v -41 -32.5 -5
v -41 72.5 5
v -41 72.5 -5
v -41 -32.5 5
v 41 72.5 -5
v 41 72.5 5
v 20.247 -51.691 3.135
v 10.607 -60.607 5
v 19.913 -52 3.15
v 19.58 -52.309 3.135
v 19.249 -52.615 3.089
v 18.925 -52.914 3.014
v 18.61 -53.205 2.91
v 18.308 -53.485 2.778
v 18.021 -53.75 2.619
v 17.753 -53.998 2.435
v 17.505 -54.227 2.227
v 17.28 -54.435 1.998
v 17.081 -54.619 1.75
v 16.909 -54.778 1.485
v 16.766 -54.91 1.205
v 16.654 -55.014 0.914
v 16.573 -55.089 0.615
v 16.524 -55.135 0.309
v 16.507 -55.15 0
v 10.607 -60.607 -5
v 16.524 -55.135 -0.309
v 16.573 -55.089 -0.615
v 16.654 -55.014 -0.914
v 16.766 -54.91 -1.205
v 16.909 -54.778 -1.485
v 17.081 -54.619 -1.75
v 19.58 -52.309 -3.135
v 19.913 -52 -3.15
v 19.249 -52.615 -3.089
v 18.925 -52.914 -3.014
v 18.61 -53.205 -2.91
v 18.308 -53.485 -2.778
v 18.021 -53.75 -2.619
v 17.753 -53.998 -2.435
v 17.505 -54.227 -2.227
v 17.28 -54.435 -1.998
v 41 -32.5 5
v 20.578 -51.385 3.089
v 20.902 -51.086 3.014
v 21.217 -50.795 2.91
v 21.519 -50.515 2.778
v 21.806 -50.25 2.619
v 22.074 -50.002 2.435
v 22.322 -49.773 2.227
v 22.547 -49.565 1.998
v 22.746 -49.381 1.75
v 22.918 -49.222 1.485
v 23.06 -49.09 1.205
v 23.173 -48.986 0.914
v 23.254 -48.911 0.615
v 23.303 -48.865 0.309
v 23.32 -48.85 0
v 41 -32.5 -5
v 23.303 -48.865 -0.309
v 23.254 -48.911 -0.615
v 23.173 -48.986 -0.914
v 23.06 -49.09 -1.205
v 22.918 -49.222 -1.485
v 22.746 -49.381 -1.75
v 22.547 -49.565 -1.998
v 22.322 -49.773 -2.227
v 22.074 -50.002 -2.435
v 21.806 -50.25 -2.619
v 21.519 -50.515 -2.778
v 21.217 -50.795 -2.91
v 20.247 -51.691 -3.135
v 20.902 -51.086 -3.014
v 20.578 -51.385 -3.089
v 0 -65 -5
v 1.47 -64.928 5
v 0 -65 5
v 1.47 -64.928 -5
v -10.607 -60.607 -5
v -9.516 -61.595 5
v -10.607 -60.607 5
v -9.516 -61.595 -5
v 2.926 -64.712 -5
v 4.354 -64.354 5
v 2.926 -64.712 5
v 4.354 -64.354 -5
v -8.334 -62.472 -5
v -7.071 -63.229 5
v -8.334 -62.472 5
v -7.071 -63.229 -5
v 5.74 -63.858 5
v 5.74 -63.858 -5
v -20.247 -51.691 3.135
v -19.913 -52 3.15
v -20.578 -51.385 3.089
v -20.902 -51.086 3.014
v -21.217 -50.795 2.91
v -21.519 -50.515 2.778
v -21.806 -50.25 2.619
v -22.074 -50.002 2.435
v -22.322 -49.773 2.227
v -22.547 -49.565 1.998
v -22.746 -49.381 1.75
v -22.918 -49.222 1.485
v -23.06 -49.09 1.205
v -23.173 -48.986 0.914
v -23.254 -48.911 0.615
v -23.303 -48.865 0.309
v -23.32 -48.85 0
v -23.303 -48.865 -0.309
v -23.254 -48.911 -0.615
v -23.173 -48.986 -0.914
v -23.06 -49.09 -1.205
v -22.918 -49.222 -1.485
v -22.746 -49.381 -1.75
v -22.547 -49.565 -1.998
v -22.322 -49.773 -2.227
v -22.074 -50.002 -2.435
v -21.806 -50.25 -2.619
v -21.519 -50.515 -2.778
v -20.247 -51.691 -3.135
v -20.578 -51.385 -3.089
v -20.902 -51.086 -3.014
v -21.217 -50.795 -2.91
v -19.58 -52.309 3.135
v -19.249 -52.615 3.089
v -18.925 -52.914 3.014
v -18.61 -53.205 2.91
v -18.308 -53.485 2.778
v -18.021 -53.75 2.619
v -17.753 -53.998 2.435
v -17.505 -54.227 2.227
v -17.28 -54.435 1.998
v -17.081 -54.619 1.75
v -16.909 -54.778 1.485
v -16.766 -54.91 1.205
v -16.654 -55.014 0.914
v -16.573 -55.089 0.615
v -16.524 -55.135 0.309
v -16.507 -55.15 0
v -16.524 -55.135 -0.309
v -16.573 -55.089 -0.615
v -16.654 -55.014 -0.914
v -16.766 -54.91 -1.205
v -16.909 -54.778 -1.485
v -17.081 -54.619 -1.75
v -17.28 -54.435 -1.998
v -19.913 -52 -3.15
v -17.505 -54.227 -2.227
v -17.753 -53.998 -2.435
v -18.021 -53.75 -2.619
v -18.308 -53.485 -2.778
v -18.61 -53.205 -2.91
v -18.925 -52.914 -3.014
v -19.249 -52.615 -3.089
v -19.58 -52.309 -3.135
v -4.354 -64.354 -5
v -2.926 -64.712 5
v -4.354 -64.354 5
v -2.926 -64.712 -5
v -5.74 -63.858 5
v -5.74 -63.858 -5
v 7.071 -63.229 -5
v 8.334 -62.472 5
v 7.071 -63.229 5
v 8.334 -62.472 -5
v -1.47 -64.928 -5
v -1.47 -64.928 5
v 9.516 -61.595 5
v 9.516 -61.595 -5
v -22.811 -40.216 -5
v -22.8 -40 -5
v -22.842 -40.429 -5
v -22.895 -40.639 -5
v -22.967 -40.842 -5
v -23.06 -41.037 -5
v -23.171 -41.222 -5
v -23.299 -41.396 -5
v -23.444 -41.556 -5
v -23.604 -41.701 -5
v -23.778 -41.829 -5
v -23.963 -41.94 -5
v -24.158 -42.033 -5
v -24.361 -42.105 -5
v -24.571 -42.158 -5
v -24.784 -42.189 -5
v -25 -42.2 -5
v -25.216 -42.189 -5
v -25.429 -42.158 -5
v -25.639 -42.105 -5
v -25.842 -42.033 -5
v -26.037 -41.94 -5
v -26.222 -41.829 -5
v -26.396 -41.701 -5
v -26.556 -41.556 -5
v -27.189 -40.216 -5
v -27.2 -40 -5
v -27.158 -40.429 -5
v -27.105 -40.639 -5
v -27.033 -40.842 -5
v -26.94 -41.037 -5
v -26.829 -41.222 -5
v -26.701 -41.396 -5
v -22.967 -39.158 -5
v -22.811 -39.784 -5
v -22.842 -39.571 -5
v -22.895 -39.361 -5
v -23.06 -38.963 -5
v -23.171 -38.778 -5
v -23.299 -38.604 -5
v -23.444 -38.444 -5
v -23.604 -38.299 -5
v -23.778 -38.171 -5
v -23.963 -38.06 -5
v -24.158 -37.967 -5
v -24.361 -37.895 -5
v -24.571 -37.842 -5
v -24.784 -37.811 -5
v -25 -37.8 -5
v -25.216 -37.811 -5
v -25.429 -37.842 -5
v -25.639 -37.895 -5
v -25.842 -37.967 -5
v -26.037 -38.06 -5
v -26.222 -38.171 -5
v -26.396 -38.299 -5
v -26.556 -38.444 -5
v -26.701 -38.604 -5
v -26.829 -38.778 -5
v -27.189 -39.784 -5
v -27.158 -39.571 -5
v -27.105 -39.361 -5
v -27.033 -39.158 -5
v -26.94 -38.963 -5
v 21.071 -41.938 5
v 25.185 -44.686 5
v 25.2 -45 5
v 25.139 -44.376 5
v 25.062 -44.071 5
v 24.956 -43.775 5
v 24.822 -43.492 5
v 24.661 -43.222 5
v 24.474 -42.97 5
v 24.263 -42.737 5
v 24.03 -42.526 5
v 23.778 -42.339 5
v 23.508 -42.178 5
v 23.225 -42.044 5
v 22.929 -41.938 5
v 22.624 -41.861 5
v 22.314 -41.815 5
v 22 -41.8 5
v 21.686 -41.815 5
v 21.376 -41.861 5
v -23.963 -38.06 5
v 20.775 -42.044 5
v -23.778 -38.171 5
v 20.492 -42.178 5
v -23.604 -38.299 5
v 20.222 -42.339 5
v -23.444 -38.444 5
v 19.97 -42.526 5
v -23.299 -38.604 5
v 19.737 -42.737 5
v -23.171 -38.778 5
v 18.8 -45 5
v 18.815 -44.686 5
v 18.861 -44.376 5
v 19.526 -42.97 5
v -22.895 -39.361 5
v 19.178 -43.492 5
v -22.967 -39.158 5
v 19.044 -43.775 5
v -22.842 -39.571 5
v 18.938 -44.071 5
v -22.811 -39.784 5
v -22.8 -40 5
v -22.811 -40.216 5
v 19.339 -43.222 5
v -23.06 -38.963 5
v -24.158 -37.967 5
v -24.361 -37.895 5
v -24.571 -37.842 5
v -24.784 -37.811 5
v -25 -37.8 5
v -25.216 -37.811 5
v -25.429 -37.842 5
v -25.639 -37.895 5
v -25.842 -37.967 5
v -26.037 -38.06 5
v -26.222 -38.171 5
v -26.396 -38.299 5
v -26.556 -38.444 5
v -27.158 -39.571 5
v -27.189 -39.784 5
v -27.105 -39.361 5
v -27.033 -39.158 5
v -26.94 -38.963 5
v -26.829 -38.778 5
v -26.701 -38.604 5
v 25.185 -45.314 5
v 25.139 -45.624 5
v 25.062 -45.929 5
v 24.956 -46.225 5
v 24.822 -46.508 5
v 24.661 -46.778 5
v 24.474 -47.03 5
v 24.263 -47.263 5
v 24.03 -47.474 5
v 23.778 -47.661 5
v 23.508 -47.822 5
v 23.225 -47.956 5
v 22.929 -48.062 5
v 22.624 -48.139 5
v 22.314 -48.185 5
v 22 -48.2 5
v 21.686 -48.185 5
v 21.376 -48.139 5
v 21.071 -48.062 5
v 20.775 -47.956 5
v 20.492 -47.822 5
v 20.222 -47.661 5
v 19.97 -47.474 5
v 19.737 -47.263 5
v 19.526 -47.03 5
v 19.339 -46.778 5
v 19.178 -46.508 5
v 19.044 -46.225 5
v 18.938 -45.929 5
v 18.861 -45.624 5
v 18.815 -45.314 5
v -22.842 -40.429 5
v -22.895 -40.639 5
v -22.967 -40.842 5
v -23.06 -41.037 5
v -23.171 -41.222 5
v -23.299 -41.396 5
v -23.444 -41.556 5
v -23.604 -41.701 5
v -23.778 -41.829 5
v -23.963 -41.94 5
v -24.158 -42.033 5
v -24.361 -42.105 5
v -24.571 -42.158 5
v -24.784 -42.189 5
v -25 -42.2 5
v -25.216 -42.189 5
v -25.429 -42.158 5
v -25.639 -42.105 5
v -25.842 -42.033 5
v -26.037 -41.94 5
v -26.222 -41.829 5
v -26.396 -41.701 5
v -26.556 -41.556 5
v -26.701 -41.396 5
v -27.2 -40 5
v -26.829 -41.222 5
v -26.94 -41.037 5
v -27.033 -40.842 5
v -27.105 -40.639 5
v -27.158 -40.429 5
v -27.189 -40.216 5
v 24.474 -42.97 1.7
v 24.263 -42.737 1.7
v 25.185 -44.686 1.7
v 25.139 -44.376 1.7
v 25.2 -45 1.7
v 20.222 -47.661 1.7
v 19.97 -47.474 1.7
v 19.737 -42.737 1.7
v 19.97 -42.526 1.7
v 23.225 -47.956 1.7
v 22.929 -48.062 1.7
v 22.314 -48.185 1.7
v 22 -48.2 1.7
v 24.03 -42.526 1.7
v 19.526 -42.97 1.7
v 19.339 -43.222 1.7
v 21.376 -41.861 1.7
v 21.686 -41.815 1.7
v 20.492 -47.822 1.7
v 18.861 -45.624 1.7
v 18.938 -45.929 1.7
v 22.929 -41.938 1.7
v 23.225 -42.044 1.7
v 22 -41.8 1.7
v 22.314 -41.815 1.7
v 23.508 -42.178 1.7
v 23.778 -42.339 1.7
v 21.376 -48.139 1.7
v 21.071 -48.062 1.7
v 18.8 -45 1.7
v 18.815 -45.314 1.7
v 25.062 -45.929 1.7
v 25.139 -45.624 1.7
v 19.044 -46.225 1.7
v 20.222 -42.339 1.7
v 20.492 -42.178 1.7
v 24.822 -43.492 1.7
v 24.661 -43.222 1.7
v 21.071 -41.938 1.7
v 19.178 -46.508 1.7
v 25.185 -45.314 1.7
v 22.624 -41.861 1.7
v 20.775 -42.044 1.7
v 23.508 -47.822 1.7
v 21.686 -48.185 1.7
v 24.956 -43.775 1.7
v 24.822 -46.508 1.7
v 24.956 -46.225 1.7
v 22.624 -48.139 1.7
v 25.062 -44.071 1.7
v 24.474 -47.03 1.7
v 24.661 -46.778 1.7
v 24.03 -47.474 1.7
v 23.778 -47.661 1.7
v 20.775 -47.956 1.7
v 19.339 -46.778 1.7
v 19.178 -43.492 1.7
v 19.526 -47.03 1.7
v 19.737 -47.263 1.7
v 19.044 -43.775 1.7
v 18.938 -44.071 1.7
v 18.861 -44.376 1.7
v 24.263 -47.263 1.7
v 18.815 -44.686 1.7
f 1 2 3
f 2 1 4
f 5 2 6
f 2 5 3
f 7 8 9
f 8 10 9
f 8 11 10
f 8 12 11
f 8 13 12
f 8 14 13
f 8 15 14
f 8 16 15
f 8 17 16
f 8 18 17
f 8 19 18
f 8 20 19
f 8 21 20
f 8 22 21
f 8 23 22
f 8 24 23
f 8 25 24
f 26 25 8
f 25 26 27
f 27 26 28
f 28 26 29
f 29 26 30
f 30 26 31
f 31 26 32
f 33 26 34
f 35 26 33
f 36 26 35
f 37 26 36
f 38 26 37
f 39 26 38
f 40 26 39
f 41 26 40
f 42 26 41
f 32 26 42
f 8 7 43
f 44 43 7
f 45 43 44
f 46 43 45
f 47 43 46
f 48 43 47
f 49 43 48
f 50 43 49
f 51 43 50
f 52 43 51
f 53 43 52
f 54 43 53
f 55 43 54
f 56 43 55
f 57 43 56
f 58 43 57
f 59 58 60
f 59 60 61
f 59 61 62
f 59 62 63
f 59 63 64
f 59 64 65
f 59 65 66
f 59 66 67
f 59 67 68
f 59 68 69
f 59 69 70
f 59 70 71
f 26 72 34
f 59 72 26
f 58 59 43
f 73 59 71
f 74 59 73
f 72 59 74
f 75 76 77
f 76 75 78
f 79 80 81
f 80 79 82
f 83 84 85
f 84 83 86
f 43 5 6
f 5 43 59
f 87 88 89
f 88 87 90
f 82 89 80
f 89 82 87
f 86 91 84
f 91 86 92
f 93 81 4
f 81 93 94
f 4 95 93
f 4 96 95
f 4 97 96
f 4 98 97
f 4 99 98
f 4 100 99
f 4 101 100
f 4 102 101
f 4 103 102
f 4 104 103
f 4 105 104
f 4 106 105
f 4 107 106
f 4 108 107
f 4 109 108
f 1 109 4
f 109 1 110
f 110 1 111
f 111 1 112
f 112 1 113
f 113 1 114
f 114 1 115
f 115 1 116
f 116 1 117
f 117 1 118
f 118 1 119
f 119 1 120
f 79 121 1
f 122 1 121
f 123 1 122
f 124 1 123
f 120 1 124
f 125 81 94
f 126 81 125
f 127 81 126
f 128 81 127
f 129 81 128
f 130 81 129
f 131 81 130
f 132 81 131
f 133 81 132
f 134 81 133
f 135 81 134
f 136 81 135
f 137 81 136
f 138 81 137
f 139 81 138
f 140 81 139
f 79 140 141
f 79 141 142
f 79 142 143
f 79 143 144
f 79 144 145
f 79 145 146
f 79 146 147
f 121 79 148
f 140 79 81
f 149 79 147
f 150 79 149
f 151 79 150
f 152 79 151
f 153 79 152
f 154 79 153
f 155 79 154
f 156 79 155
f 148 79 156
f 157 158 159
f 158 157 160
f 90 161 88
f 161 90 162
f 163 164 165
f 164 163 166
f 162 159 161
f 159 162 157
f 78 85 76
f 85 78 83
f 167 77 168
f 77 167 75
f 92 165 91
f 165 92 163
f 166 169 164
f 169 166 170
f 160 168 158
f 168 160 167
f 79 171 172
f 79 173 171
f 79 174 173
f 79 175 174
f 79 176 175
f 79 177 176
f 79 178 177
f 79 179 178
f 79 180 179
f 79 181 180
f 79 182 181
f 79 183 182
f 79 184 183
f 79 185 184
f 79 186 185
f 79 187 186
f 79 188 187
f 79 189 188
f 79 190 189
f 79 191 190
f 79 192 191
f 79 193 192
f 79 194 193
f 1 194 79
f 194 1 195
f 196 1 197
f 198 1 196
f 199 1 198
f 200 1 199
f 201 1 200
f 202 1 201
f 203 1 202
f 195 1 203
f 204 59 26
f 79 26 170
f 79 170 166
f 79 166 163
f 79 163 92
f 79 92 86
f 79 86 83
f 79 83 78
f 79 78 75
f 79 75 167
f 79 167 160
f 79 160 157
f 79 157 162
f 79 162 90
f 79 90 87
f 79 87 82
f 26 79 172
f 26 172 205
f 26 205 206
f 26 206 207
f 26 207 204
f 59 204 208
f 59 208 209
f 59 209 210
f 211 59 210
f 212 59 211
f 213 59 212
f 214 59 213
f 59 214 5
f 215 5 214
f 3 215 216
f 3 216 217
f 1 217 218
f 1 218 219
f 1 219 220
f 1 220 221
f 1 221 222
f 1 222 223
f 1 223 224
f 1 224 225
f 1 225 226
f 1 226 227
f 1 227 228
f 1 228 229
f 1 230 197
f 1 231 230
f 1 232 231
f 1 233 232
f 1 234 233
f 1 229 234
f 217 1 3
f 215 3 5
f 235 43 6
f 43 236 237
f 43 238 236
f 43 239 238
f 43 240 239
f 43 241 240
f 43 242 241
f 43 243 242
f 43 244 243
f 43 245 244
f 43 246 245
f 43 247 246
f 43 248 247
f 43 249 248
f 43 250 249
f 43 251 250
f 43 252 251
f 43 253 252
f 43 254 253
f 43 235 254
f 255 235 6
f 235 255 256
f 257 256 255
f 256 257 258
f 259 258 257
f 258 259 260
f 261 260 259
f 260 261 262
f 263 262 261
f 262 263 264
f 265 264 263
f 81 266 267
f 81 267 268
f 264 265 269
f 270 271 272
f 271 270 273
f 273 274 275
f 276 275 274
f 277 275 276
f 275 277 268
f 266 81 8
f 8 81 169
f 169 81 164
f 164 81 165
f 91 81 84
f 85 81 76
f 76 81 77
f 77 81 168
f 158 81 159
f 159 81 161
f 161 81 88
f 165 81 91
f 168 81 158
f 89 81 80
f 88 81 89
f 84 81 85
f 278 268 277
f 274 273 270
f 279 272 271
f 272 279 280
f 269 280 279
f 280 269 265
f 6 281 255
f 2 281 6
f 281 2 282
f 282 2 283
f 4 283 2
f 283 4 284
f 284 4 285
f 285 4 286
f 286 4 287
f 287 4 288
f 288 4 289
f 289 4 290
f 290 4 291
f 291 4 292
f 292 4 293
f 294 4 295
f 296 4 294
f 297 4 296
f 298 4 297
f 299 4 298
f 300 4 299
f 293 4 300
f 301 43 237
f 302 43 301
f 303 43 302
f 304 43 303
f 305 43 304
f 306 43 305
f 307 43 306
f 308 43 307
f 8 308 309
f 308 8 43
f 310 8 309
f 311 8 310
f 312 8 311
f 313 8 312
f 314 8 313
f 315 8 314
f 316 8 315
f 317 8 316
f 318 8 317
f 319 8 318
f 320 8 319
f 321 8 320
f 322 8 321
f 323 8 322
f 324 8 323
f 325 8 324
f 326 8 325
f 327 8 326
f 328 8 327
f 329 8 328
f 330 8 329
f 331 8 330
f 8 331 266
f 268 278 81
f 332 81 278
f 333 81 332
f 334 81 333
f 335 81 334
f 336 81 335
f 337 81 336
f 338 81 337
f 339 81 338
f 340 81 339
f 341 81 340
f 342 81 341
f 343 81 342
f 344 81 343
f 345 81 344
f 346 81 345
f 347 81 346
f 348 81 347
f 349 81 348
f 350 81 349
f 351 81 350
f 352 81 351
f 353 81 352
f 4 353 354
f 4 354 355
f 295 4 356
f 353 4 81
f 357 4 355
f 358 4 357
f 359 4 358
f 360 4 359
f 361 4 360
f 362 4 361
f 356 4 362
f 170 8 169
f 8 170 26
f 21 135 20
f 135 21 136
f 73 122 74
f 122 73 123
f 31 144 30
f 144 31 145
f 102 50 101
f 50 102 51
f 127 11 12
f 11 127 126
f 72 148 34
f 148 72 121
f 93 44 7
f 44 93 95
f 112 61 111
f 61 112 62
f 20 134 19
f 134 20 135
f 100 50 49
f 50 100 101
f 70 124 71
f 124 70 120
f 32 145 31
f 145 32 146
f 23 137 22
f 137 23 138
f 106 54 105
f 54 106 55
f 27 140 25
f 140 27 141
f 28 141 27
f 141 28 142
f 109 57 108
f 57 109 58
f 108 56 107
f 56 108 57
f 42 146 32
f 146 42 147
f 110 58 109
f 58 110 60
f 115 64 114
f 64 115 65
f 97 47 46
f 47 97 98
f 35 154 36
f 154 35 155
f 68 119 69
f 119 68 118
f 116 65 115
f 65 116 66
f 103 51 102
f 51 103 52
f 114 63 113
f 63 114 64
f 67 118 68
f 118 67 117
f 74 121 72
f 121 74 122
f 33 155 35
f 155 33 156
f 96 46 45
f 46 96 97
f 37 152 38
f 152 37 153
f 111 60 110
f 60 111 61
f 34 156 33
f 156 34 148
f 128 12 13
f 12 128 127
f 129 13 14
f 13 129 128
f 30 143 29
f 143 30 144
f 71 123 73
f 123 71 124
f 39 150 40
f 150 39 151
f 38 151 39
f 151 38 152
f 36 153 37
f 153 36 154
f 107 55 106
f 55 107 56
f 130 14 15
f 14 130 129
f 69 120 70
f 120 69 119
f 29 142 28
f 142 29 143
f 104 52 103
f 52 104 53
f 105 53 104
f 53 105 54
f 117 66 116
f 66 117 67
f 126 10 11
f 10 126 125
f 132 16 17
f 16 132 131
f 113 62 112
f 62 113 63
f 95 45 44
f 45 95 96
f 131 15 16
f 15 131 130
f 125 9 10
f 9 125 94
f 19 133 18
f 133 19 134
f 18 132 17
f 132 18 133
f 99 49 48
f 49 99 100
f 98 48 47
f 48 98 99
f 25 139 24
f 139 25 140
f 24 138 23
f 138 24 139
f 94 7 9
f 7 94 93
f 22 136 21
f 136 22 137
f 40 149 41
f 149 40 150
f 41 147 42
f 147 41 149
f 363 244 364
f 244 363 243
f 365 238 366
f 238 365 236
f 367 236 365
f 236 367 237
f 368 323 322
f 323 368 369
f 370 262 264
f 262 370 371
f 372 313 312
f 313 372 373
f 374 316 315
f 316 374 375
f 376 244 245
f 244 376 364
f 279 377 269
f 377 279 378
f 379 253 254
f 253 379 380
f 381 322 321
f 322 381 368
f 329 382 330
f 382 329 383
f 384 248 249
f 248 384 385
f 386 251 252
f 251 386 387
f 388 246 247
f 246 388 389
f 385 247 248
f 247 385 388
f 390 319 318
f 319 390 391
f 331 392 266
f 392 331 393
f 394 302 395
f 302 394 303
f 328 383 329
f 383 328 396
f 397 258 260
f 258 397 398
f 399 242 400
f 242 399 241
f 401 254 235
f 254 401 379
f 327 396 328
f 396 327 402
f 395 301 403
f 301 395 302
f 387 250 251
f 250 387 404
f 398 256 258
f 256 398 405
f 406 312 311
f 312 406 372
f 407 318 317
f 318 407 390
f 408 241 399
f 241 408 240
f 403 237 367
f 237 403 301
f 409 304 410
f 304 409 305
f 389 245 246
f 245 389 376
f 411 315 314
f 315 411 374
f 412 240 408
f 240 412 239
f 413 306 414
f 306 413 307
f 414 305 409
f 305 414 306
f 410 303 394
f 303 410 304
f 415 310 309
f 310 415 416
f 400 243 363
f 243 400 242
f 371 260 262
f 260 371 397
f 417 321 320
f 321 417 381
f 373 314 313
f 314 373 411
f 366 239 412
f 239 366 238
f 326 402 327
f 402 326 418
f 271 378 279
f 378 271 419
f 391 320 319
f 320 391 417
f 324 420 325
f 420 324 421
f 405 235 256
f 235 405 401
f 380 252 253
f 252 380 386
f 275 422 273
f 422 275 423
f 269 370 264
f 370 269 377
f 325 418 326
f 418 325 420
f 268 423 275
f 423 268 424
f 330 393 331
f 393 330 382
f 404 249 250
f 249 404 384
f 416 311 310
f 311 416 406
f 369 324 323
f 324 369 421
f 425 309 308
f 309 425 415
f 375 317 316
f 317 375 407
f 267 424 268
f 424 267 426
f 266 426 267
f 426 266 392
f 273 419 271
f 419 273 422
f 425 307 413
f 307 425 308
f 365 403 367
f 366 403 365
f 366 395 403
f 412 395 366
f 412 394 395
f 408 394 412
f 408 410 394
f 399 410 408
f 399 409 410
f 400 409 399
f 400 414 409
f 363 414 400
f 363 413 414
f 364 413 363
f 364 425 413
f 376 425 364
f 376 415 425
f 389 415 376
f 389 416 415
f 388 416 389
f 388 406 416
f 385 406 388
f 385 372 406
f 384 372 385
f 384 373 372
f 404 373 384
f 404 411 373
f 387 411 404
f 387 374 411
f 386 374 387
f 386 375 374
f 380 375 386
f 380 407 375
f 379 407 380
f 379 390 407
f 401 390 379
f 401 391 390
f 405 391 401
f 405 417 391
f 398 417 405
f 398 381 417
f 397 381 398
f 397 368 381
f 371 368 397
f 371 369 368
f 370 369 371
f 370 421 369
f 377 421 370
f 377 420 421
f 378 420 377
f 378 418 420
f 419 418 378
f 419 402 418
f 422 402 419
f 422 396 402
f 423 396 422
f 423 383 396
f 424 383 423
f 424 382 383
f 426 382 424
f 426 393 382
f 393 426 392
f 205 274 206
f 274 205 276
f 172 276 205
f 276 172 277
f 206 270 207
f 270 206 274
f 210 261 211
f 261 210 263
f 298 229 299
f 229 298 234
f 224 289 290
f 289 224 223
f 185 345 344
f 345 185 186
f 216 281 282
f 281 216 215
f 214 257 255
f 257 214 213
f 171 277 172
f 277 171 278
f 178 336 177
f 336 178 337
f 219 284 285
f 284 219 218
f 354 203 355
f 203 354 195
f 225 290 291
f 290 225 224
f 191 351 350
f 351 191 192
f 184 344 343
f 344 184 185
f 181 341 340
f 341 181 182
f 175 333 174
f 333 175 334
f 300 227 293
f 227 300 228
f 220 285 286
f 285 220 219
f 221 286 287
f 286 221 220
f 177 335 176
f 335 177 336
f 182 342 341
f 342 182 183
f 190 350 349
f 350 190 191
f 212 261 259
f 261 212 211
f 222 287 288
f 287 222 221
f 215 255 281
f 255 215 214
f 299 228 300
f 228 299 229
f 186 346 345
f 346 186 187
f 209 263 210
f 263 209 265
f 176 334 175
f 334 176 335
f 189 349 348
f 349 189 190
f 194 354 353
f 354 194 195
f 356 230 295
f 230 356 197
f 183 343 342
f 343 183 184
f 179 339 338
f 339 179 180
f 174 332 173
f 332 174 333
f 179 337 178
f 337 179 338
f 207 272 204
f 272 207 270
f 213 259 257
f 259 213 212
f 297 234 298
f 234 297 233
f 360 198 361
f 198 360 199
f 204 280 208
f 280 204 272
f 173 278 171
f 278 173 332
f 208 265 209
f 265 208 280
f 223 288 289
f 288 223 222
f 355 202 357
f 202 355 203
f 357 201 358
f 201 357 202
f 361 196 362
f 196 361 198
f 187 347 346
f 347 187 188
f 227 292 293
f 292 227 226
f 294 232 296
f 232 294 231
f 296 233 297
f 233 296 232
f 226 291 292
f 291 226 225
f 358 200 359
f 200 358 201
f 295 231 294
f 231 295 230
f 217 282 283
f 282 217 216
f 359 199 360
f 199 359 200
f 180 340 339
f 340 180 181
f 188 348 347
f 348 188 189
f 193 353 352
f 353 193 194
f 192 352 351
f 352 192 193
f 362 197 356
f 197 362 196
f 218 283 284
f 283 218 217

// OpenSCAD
// 135er Helicopter Controller - left toe brake V1.1
$fn=64;
plate_w=82; plate_h=150; plate_t=10;
pivot_d=6.3; pivot_y=-52;
magnet_d=6.4; magnet_h=3.2;
spring_d=4.4;

difference(){
    hull(){
        translate([0,20,0]) cube([plate_w,105,plate_t],center=true);
        translate([0,-50,0]) cylinder(h=plate_t,d=30,center=true);
    }
    translate([0,pivot_y,0]) rotate([0,90,0]) cylinder(h=plate_w+4,d=pivot_d,center=true);
    translate([22,-45,plate_t/2-magnet_h/2]) cylinder(h=magnet_h+0.2,d=magnet_d,center=true);
    translate([-25,-40,0]) cylinder(h=plate_t+2,d=spring_d,center=true);
}
